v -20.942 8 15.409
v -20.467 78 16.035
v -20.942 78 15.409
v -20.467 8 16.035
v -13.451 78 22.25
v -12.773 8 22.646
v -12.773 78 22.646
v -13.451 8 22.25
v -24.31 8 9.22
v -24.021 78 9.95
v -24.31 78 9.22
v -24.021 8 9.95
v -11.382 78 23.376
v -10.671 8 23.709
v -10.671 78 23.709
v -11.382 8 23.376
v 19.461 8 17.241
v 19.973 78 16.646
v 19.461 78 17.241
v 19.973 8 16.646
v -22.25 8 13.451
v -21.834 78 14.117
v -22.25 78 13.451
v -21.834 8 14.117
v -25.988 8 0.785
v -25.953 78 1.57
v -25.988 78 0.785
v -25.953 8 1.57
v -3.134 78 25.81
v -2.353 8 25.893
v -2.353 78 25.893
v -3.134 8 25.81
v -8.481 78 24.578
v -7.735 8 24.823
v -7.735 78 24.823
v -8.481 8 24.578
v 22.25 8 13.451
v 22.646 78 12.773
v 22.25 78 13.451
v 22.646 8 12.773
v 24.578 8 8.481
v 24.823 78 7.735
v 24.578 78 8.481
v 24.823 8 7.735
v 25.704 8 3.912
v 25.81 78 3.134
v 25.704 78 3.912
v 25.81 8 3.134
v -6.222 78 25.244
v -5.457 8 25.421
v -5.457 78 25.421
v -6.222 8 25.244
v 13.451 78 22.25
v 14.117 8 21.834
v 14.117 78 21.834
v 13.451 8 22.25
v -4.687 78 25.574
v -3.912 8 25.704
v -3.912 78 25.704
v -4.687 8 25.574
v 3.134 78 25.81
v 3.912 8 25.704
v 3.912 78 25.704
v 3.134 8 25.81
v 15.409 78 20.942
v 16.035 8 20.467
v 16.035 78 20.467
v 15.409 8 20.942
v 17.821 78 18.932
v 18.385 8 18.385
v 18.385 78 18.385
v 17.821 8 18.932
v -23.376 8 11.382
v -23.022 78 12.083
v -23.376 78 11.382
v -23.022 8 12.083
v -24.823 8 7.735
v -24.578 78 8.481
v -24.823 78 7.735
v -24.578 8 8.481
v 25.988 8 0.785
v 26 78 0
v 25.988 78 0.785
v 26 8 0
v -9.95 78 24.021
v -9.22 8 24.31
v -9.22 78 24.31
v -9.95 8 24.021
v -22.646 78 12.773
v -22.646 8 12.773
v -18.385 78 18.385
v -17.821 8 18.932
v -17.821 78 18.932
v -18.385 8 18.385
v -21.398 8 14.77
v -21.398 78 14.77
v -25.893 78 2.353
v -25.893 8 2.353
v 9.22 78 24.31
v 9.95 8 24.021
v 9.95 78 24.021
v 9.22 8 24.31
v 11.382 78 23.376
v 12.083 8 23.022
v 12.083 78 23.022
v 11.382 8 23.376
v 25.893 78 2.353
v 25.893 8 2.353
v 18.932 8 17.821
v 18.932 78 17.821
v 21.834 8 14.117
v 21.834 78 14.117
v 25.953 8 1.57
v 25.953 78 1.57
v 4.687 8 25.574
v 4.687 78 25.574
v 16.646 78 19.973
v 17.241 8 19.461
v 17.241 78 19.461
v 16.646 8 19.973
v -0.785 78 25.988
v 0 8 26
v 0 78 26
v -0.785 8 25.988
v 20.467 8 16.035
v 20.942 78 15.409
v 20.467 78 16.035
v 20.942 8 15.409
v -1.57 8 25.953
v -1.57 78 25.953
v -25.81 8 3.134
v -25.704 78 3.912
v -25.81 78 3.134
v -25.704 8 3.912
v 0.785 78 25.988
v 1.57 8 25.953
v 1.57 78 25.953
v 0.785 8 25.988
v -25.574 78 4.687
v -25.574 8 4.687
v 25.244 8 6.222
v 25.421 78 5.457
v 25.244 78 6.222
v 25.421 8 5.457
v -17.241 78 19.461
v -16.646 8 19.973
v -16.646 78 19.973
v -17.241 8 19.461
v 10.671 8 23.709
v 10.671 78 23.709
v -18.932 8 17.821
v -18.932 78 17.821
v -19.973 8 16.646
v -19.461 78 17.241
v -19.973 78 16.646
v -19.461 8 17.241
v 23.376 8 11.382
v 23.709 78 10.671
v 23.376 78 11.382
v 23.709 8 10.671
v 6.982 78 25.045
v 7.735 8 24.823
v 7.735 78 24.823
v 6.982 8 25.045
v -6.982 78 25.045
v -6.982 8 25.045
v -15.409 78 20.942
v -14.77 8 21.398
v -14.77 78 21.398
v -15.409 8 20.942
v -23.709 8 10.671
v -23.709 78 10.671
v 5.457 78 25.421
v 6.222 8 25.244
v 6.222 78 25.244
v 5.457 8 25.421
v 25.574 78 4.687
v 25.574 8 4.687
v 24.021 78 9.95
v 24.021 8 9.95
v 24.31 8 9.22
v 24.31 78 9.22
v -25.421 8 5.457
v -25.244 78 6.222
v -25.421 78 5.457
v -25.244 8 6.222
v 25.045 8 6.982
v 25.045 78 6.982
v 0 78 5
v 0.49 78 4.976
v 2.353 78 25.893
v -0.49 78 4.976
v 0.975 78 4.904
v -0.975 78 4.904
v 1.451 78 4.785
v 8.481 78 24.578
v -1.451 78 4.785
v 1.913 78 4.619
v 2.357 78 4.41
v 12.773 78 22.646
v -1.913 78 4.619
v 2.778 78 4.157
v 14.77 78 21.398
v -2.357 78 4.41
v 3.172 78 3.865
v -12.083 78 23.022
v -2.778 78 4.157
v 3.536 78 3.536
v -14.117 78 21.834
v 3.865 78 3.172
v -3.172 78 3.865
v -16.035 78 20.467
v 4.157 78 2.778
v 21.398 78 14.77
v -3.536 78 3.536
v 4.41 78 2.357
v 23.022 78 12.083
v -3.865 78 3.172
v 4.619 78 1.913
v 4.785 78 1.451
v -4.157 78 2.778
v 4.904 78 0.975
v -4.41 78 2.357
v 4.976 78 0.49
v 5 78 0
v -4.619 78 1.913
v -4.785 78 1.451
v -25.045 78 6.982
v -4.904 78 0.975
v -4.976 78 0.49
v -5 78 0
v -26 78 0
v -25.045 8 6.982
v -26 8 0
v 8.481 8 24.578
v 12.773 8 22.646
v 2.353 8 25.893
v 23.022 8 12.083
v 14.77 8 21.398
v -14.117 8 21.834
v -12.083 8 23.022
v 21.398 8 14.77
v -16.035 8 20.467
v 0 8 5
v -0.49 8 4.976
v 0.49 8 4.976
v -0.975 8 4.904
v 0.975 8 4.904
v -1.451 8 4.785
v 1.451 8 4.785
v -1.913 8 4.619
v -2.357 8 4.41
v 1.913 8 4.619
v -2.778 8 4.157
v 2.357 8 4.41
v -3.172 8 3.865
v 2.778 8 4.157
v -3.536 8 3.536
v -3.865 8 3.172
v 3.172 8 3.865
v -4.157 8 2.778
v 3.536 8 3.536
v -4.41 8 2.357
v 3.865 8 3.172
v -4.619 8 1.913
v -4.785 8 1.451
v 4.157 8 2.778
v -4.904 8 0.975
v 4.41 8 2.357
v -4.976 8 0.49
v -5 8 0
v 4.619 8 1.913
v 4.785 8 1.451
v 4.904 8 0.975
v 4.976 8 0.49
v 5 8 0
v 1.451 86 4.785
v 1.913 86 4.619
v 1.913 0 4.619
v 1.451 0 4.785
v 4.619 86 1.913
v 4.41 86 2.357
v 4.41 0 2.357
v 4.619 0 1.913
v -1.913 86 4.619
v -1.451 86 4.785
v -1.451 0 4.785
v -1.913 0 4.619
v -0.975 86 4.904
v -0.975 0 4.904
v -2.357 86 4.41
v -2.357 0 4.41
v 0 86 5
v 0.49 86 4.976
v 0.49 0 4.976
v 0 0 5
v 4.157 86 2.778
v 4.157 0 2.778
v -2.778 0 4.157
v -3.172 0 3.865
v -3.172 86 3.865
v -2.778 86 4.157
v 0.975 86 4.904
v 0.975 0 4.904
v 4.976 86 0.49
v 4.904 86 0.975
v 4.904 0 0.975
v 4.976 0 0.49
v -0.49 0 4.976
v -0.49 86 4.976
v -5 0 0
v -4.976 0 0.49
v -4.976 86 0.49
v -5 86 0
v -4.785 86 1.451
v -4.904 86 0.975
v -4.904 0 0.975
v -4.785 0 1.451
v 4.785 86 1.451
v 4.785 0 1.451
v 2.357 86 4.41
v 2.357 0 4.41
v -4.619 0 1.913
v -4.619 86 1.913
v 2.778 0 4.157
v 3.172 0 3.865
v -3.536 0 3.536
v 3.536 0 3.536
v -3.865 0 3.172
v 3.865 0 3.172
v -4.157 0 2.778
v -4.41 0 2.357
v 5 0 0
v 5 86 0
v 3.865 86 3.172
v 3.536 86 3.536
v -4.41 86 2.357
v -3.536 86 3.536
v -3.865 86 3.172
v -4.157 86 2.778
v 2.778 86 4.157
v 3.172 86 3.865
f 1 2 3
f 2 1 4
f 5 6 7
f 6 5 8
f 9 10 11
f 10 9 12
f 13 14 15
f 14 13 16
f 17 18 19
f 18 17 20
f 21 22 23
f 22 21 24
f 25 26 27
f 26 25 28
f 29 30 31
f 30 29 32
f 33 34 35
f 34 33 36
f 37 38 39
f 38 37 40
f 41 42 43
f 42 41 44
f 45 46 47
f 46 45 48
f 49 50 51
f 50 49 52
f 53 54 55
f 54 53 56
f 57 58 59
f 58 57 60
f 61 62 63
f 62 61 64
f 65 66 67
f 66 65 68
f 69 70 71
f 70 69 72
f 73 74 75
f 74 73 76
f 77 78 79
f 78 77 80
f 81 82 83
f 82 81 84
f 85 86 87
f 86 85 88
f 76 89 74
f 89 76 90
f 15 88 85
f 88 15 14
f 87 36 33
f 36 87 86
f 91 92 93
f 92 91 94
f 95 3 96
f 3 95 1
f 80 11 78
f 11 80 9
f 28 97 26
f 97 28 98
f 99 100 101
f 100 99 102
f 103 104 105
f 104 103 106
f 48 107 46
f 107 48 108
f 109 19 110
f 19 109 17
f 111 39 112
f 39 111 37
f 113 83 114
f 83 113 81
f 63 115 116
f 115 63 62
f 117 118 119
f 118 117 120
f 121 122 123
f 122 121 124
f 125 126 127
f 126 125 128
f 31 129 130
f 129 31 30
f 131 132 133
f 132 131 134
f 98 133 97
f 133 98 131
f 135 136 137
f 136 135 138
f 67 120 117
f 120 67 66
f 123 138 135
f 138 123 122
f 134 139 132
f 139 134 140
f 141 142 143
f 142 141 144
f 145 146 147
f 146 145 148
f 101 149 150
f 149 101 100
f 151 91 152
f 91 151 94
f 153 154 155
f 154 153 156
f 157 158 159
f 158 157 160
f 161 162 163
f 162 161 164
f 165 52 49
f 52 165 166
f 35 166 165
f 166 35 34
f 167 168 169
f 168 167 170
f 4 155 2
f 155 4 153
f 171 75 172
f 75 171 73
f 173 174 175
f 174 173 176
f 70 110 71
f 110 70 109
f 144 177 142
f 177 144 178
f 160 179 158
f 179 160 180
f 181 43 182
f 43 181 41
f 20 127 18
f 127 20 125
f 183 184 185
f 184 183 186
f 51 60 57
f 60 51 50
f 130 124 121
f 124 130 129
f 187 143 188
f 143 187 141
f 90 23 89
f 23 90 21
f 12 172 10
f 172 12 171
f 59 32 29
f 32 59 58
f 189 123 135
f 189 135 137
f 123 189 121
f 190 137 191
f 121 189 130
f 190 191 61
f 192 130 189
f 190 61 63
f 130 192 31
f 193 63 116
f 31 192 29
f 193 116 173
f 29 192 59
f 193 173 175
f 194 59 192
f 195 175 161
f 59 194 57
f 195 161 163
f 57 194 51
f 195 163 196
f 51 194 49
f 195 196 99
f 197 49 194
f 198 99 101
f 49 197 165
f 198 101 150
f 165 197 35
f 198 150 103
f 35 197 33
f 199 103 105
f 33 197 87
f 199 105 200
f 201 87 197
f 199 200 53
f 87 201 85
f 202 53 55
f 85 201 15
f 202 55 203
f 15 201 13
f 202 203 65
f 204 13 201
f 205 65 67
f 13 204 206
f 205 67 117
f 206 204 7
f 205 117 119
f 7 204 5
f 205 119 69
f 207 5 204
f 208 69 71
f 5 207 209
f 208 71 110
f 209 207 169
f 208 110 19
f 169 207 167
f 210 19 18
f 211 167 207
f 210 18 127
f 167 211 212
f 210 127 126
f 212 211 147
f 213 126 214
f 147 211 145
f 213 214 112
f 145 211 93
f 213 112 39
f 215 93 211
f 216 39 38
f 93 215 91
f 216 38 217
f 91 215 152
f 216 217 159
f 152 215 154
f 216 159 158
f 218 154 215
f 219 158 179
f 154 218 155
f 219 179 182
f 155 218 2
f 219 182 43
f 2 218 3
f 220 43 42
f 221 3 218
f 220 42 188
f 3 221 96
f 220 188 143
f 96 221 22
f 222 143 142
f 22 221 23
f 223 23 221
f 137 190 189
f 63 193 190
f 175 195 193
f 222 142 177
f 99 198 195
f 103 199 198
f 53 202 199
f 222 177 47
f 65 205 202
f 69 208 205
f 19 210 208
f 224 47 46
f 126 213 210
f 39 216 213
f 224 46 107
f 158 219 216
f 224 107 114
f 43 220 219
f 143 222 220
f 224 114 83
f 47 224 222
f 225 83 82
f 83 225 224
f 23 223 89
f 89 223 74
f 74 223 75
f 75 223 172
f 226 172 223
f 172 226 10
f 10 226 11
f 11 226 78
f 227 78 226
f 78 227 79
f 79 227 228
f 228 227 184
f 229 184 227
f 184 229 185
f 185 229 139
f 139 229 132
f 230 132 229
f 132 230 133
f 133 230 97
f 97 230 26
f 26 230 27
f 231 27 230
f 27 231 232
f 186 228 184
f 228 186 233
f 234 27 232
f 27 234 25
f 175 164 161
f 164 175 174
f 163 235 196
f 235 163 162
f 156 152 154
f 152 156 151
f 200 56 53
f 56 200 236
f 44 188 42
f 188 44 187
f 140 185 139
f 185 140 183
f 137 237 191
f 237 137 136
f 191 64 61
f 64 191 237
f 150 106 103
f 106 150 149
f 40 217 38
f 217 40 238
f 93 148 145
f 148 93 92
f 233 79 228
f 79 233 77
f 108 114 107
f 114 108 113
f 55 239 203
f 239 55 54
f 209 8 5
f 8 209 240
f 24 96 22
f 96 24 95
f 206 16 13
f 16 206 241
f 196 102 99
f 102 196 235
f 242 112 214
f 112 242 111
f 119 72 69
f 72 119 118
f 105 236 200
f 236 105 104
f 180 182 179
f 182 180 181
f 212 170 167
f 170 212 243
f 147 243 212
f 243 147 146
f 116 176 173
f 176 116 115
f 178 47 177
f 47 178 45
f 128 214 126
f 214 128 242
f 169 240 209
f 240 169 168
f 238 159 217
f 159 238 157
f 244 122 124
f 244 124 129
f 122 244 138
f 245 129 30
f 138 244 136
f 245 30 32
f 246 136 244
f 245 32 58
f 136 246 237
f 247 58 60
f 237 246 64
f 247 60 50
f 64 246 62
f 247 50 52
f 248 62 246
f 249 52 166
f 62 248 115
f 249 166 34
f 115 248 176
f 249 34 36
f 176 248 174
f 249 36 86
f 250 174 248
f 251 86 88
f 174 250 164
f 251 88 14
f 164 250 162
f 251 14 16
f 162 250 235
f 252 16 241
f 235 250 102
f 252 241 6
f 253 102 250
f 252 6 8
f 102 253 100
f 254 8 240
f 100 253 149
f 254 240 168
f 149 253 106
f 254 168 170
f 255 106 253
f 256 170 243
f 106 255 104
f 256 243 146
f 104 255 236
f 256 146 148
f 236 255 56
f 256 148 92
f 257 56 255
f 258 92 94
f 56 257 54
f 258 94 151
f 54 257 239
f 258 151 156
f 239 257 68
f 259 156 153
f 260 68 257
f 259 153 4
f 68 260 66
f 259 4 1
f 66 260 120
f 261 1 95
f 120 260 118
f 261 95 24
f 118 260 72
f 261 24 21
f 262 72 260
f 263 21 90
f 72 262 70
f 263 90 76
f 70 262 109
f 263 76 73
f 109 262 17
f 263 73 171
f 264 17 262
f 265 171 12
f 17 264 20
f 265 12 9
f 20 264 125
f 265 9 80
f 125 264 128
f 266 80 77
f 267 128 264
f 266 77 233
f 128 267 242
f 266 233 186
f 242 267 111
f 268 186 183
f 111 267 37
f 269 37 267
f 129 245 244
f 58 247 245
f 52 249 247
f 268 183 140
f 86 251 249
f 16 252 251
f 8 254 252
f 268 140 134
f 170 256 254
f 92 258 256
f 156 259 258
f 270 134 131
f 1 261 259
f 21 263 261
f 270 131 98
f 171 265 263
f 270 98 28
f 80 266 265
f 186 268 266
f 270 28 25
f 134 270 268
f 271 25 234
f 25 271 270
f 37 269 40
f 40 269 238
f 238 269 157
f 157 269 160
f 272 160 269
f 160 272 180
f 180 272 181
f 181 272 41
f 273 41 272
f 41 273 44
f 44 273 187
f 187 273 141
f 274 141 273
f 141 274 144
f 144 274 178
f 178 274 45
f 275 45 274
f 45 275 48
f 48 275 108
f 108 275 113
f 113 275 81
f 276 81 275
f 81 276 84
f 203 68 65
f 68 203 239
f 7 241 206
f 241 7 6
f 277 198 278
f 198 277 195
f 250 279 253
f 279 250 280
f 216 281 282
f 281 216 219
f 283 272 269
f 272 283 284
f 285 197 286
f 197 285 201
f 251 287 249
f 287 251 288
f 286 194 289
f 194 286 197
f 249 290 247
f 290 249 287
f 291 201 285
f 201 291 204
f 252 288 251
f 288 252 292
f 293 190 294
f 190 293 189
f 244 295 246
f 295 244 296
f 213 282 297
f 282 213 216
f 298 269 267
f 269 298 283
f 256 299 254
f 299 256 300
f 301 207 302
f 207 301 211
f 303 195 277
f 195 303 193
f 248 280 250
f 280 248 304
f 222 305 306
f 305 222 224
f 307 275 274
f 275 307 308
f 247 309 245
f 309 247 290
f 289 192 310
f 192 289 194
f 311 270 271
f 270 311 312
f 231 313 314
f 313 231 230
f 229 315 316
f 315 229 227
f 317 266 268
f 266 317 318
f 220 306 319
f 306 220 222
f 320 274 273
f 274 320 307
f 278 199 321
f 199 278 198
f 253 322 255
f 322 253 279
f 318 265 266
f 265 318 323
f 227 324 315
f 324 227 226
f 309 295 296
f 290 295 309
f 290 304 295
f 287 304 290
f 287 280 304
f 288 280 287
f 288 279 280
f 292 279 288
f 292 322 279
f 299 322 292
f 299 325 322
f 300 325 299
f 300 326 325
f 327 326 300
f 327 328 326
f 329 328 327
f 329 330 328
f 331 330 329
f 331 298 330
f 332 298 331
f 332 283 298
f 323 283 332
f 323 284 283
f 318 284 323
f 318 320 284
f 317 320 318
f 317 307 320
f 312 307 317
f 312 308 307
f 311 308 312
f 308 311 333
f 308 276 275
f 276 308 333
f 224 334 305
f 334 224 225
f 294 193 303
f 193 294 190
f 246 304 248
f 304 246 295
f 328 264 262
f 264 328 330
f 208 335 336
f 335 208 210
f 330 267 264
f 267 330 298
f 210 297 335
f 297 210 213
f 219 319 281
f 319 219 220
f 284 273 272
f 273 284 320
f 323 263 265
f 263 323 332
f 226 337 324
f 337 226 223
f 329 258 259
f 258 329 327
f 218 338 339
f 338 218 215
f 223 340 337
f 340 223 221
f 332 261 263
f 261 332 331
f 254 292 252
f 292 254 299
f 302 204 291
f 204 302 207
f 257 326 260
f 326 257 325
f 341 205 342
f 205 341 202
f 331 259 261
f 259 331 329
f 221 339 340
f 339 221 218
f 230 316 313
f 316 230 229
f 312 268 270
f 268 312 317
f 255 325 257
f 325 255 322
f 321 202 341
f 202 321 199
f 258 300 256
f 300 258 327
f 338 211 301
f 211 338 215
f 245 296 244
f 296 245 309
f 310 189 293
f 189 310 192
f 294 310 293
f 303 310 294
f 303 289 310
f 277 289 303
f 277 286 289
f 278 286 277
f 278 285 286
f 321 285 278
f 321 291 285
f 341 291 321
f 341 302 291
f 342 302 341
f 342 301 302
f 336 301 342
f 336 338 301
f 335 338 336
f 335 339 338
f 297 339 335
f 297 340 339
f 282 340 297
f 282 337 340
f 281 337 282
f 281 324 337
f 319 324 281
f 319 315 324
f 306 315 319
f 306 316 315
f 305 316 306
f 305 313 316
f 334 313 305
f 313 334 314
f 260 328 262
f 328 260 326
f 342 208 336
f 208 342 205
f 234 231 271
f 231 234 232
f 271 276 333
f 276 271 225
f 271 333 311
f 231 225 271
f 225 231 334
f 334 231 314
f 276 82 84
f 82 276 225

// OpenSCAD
module PrintOrientation(){
  difference(){
    union(){
      translate([0, 0, 8])cylinder(d=52,h=70,$fn=208);
      cylinder(d=10,h=86,$fn=64);
    }

    translate([0, 0, -0.004])linear_extrude(height=86.008)translate([-26, 0, 0])square([52, 52]);
  }
}
$fn=64;
rotate([-90, 0, 0])color("gold")PrintOrientation();
